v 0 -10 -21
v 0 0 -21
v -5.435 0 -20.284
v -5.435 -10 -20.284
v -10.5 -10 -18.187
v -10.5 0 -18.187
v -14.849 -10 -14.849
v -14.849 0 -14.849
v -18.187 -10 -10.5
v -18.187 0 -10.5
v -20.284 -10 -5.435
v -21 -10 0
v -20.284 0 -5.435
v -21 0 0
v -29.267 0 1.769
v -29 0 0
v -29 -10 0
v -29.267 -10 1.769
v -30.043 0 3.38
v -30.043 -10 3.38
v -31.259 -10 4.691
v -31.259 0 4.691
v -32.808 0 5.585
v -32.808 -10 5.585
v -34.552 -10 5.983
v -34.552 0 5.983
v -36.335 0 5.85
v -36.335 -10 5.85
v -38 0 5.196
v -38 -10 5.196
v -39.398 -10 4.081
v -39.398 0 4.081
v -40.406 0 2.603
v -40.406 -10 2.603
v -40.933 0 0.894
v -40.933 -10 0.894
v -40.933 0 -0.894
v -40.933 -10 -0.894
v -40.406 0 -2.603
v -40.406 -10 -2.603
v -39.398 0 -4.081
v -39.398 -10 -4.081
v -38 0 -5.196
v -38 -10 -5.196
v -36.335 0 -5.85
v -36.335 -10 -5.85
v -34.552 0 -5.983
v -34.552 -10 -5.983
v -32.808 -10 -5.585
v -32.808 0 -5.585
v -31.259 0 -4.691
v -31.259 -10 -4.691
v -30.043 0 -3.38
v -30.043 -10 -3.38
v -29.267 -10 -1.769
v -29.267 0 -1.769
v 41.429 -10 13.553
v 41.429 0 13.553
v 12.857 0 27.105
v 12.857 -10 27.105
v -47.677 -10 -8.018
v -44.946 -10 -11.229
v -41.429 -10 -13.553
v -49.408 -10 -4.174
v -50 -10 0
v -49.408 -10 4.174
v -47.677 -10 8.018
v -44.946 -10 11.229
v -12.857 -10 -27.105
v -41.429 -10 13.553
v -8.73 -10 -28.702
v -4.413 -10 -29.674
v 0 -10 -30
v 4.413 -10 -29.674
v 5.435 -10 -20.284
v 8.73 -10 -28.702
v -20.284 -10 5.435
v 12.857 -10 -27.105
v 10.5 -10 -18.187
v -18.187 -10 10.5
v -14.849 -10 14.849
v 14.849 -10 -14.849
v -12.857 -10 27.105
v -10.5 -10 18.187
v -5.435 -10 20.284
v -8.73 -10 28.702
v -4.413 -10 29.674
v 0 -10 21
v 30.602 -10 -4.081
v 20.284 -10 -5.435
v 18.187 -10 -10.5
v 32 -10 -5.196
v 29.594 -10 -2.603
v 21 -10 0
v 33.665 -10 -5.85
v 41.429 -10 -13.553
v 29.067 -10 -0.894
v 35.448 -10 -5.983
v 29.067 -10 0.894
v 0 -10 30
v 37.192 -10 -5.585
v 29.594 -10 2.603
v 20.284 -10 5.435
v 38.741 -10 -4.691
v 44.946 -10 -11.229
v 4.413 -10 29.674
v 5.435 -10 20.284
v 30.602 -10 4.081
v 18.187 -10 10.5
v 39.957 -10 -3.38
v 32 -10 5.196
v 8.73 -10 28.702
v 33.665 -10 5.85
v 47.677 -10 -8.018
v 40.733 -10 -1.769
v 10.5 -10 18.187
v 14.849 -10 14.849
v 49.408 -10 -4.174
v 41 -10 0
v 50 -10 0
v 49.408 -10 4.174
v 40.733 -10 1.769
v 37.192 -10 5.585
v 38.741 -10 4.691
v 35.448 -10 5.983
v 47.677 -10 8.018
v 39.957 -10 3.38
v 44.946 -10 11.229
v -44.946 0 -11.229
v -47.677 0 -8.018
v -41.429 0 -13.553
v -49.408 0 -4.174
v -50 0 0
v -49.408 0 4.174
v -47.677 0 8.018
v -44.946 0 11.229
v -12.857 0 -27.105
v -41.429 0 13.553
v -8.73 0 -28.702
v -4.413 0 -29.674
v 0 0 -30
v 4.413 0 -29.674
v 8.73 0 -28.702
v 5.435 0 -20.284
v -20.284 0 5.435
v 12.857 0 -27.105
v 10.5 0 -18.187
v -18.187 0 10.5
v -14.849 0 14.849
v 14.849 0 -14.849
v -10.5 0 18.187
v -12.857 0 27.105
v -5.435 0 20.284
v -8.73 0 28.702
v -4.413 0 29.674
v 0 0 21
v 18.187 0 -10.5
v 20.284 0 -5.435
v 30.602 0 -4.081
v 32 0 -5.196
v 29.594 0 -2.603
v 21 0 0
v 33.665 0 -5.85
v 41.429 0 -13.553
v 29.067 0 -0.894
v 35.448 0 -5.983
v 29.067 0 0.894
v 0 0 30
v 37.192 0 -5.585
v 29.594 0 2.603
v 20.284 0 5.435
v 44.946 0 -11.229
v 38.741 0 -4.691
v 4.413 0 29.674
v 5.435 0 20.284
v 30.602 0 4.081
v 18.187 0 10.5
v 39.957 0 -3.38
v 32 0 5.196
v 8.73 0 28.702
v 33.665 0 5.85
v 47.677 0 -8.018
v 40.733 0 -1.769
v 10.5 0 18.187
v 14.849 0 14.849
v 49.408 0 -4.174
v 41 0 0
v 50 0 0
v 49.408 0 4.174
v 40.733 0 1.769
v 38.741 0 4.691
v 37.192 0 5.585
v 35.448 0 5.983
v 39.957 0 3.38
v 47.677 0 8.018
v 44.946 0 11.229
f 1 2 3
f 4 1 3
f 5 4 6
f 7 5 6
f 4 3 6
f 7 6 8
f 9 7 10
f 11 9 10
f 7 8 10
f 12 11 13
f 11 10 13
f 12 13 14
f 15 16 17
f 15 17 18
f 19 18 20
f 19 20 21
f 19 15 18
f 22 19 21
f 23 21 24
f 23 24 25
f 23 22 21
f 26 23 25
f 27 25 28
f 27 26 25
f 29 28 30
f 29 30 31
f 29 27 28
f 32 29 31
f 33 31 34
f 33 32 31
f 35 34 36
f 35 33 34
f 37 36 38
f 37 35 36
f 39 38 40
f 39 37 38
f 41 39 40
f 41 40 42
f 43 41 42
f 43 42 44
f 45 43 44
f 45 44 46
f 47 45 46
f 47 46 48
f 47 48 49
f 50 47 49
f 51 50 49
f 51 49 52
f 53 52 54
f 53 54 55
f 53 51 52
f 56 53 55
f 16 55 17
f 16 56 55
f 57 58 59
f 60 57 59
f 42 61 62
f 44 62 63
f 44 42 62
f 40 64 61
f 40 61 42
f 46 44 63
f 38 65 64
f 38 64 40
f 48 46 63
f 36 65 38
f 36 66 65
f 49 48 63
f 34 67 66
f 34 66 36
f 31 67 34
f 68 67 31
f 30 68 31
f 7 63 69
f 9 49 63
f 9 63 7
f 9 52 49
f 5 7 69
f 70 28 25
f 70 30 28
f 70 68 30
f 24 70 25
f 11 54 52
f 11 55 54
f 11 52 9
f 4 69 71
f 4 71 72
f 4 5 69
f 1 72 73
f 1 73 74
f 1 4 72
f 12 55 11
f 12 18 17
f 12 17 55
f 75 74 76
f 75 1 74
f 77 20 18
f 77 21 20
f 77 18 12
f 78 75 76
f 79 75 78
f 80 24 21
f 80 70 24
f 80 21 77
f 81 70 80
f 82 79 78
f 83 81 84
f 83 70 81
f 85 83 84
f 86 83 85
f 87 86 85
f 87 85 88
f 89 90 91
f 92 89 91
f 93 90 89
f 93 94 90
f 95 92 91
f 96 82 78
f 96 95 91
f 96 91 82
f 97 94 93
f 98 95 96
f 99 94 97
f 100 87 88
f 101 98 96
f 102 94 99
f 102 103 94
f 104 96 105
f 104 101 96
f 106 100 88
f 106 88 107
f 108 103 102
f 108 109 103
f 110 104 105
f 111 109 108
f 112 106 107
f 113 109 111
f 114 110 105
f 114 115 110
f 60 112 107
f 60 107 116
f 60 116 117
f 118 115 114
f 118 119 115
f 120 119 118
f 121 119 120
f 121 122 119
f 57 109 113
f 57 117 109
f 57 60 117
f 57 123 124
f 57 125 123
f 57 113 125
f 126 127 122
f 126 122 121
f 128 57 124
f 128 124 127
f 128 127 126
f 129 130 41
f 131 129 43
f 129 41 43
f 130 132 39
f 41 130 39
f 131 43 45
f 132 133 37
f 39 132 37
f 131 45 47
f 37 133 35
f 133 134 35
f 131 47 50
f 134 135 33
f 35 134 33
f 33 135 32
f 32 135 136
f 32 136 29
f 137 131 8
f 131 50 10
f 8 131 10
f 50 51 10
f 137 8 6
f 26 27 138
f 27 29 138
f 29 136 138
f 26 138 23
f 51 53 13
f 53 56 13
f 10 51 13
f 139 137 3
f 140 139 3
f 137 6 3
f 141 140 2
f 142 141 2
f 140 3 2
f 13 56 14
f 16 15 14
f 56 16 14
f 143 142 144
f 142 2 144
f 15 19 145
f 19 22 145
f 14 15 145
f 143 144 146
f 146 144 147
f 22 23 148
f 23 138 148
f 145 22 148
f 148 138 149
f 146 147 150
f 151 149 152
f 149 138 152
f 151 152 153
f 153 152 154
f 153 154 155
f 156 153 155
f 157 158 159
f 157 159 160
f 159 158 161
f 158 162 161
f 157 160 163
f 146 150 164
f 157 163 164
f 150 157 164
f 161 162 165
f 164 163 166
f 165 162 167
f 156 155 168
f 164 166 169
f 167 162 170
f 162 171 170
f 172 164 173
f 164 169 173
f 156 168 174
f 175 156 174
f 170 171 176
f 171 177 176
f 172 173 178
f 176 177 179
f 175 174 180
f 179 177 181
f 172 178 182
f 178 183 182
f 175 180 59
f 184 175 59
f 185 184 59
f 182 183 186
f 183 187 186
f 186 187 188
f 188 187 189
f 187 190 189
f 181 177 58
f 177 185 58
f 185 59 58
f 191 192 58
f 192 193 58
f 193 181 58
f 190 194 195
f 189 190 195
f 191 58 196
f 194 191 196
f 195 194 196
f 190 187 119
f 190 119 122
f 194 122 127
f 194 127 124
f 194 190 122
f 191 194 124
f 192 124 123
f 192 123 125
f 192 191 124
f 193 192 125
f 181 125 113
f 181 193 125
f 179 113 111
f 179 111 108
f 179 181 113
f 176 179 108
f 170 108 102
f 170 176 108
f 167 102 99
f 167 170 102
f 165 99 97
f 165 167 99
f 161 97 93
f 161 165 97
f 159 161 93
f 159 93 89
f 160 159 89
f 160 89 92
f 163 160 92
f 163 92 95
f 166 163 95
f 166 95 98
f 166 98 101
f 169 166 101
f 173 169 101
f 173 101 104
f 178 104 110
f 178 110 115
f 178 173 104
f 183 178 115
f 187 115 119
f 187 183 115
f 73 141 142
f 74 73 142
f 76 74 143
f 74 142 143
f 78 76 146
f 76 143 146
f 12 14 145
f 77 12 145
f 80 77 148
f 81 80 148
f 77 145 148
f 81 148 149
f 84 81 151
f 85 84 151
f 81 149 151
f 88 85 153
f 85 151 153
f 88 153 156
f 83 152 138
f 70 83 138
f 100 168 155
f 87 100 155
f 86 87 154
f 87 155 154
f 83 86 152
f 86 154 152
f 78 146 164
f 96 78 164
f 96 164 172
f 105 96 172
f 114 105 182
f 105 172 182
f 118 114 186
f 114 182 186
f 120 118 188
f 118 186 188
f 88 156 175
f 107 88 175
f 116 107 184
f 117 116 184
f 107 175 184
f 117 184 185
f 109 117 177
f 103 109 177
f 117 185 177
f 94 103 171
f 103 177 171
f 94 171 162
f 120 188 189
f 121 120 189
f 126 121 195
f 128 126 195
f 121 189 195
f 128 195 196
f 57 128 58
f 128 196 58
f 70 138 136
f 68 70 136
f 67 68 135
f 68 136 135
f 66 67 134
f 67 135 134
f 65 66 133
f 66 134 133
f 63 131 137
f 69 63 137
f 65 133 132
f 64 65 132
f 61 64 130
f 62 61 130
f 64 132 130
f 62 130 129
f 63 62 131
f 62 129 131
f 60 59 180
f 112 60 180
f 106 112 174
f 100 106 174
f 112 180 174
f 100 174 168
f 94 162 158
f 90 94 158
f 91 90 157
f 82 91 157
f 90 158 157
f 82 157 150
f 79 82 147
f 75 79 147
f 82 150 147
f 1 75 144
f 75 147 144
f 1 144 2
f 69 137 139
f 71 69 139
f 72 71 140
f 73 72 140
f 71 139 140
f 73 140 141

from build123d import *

# Parameters (mm, degrees)
F0_R     = 6
F1_DEPTH = 10


with BuildPart() as f1:
    # F0 (on Front) → F1 (new body)
    with BuildSketch(Plane.XZ):
        with BuildLine():
            Line((41.428571, 13.552619), (12.857143, 27.105237))
            ThreePointArc((12.857143, 27.105237), (6.589495, 29.267363), (0, 30))
            ThreePointArc((0, 30), (-6.589495, 29.267363), (-12.857143, 27.105237))
            Line((-12.857143, 27.105237), (-41.428571, 13.552619))
            ThreePointArc((-41.428571, 13.552619), (-47.677314, 8.017837), (-50, 0))
            ThreePointArc((-50, 0), (-47.677314, -8.017837), (-41.428571, -13.552619))
            Line((-41.428571, -13.552619), (-12.857143, -27.105237))
            ThreePointArc((-12.857143, -27.105237), (-6.589495, -29.267363), (0, -30))
            ThreePointArc((0, -30), (6.589495, -29.267363), (12.857143, -27.105237))
            Line((12.857143, -27.105237), (41.428571, -13.552619))
            ThreePointArc((41.428571, -13.552619), (47.677314, -8.017837), (50, 0))
            ThreePointArc((50, 0), (47.677314, 8.017837), (41.428571, 13.552619))
        make_face()
        with Locations((-35, 0)):
            Circle(F0_R, mode=Mode.SUBTRACT)
        with BuildLine():
            ThreePointArc((0, 21), (14.849242, 14.849242), (21, 0))
            ThreePointArc((21, 0), (14.849242, -14.849242), (0, -21))
            ThreePointArc((0, -21), (-14.849242, -14.849242), (-21, 0))
            ThreePointArc((-21, 0), (-14.849242, 14.849242), (0, 21))
        make_face(mode=Mode.SUBTRACT)
        with Locations((35, 0)):
            Circle(F0_R, mode=Mode.SUBTRACT)
    extrude(amount=F1_DEPTH)


solid = f1.part
